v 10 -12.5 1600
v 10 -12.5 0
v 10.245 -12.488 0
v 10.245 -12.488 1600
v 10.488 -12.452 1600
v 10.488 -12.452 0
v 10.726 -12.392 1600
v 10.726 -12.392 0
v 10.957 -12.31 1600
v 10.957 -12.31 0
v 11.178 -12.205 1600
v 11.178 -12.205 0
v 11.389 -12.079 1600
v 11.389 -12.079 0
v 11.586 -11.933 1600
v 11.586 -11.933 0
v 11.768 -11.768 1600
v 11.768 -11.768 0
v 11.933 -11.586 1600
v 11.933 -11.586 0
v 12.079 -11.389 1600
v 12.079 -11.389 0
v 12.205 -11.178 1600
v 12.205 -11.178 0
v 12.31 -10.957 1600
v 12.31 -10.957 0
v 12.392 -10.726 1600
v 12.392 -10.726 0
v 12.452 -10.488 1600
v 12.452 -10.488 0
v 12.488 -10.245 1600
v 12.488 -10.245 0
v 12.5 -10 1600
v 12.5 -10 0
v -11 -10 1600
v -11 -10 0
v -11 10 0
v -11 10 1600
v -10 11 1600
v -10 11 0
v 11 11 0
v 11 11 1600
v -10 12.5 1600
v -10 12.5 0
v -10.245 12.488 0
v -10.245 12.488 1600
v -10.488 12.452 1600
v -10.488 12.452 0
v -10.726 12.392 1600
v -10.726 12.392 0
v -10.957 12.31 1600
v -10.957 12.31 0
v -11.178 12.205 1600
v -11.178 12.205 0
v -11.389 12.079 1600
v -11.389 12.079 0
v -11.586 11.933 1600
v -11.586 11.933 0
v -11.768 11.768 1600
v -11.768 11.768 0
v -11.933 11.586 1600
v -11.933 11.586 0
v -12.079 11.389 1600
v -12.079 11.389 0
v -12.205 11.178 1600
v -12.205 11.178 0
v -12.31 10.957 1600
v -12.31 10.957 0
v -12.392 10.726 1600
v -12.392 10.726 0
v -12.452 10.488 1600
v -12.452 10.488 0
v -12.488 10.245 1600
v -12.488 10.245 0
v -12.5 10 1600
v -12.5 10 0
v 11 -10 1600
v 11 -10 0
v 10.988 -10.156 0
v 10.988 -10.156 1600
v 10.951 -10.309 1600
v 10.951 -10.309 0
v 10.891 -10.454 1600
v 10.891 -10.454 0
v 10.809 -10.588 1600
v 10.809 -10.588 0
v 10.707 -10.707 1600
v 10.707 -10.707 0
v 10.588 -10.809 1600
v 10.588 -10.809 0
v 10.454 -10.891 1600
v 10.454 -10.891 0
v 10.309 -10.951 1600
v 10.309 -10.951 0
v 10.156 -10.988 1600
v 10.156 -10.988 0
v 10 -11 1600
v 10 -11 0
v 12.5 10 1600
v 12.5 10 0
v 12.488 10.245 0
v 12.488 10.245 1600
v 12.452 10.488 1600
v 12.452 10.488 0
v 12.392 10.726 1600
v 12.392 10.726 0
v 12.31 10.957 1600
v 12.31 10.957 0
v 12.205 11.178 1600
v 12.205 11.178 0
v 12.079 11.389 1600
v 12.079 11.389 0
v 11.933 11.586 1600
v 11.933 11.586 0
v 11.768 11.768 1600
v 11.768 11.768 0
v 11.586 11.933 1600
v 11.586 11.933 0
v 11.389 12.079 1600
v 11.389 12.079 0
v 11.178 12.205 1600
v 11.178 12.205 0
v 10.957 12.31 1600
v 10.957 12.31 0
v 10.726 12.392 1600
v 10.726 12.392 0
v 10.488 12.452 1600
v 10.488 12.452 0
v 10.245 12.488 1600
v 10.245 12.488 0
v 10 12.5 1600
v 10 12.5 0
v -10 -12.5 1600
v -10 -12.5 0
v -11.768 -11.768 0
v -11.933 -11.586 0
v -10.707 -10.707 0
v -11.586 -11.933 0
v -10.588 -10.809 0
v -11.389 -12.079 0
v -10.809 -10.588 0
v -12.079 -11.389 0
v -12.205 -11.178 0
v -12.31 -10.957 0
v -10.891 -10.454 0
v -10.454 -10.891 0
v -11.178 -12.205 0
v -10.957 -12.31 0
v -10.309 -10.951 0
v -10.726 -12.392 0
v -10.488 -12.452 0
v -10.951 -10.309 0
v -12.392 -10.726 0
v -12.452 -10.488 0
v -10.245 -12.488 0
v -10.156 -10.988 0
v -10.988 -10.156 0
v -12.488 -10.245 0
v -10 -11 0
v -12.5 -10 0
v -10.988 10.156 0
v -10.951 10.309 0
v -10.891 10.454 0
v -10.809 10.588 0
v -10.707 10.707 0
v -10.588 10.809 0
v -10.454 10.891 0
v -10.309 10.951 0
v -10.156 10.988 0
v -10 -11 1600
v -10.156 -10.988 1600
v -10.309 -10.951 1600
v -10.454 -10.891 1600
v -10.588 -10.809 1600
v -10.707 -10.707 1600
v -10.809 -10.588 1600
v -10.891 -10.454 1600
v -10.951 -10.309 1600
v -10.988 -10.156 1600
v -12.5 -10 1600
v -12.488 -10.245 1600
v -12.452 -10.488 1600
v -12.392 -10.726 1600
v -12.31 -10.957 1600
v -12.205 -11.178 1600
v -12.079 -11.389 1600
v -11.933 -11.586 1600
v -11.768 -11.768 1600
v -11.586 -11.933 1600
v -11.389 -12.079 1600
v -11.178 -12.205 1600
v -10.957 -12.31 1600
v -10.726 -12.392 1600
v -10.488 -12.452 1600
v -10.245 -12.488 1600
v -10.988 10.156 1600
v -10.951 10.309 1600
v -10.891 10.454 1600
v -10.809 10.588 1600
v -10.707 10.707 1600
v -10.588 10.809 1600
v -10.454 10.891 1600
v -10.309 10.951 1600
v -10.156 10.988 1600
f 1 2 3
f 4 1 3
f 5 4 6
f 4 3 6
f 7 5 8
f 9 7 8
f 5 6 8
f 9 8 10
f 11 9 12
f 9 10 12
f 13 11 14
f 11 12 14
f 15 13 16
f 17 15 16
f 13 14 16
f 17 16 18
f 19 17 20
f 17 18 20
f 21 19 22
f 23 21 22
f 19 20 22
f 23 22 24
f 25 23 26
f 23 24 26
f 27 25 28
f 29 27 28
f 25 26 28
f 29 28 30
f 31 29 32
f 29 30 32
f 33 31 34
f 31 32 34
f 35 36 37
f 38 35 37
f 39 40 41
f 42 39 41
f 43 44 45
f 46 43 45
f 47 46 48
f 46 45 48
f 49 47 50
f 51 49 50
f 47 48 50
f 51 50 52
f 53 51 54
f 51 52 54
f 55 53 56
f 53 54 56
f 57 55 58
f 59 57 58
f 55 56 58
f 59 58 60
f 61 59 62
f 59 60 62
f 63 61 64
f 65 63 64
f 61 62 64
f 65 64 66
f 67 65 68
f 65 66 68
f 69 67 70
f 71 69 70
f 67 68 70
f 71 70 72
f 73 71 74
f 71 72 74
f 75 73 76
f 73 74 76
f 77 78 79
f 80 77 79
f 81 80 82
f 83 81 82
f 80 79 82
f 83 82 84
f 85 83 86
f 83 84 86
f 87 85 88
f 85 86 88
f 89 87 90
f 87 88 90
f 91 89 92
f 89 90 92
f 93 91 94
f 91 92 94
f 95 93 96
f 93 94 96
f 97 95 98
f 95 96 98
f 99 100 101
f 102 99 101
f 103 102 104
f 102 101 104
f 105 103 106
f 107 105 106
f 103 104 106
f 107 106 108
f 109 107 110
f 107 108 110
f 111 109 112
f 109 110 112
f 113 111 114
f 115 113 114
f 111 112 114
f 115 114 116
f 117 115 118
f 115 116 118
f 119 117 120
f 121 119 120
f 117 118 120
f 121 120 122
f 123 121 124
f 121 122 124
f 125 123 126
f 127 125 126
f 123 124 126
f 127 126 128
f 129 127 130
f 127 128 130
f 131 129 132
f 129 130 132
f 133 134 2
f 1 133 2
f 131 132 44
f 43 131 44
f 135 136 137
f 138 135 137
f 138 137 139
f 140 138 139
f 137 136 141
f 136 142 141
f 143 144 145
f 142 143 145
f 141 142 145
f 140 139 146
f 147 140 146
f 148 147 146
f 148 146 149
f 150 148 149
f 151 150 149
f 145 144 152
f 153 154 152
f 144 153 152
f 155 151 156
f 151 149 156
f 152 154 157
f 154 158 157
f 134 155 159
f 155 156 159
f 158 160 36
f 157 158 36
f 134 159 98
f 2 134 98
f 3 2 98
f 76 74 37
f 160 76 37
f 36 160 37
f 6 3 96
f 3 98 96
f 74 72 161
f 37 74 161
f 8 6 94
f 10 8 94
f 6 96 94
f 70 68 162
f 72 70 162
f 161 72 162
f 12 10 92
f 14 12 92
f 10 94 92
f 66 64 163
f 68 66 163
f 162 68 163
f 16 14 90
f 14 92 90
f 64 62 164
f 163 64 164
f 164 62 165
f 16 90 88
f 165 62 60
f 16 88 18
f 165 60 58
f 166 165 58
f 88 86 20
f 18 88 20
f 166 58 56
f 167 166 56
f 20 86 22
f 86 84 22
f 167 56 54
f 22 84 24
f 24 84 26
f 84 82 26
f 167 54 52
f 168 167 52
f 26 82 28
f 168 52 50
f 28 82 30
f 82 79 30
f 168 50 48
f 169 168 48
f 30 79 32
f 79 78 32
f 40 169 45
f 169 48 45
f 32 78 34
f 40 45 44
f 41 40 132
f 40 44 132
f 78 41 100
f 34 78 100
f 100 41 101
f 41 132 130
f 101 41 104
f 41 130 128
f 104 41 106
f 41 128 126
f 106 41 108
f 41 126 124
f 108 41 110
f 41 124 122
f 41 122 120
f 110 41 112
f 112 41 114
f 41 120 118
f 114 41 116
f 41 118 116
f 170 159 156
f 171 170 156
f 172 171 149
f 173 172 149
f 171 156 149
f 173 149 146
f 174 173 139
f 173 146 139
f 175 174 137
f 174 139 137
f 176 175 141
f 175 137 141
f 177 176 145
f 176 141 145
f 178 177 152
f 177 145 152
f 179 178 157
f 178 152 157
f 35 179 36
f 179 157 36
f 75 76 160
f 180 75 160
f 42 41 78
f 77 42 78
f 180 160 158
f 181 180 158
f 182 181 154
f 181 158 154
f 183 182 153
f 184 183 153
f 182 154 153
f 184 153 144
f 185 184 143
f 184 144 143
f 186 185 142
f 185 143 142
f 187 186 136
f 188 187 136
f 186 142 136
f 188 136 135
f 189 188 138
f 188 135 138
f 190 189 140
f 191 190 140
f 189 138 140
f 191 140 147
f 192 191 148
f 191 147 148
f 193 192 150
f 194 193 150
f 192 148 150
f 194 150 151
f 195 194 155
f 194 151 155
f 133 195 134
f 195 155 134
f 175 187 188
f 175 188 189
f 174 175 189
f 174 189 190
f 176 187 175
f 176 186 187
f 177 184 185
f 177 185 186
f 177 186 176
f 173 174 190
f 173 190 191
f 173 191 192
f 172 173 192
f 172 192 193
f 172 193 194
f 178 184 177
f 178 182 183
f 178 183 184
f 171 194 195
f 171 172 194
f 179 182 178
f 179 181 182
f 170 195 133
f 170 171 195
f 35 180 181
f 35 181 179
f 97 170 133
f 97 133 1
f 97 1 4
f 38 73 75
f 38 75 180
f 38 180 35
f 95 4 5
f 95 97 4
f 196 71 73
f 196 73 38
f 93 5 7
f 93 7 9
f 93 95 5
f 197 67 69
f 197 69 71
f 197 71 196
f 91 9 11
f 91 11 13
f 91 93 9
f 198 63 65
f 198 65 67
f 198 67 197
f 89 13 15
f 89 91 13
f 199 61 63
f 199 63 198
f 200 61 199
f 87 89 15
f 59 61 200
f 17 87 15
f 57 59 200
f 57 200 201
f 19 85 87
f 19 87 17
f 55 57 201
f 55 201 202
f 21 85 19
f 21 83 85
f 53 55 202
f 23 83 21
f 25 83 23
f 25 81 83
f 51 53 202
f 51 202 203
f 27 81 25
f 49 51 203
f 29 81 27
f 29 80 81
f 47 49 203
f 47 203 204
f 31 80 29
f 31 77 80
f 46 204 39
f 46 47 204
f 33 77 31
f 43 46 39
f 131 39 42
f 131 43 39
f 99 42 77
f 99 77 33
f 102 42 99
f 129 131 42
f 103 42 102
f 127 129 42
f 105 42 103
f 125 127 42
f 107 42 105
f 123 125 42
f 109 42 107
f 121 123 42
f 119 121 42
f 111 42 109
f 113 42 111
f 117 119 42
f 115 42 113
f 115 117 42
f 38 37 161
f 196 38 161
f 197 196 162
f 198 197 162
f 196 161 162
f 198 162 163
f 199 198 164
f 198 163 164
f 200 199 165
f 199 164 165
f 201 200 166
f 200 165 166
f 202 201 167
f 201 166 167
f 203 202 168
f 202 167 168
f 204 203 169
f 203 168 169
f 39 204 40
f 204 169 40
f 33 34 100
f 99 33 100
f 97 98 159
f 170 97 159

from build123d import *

# Parameters (mm, degrees)
F1_DEPTH = 1600


with BuildPart() as f1:
    # F0 (on Top) → F1 (new body)
    with BuildSketch(Plane.XY):
        with BuildLine():
            ThreePointArc((12.5, 10), (11.767767, 11.767767), (10, 12.5))
            Line((10, 12.5), (-10, 12.5))
            ThreePointArc((-10, 12.5), (-11.767767, 11.767767), (-12.5, 10))
            Line((-12.5, 10), (-12.5, -10))
            ThreePointArc((-12.5, -10), (-11.767767, -11.767767), (-10, -12.5))
            Line((-10, -12.5), (10, -12.5))
            ThreePointArc((10, -12.5), (11.767767, -11.767767), (12.5, -10))
            Line((12.5, -10), (12.5, 10))
        make_face()
        with BuildLine():
            ThreePointArc((11, -10), (10.707107, -10.707107), (10, -11))
            Line((10, -11), (-10, -11))
            ThreePointArc((-10, -11), (-10.707107, -10.707107), (-11, -10))
            Line((-11, -10), (-11, 10))
            ThreePointArc((-11, 10), (-10.707107, 10.707107), (-10, 11))
            Line((-10, 11), (11, 11))
            Line((11, 11), (11, -10))
        make_face(mode=Mode.SUBTRACT)
    extrude(amount=F1_DEPTH)


solid = f1.part
